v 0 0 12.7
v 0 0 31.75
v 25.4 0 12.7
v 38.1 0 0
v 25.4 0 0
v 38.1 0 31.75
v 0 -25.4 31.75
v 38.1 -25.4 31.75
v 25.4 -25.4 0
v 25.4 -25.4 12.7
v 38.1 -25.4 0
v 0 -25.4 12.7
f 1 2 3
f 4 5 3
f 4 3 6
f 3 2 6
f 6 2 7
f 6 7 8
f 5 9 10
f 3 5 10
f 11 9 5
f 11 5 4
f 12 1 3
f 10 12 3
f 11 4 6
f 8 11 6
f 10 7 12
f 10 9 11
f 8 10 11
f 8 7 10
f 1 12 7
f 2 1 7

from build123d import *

# Parameters (mm, degrees)
F0_W     = 38.1
F0_H     = 31.75
F1_DEPTH = 25.4
F2_W     = 25.3788903356
F2_H     = 12.7
F3_DEPTH = 25.4
F4_DEPTH = 25.4
F5_DEPTH = 25.4
F6_DEPTH = 25.4


with BuildPart() as f1:
    # F0 (on Front) → F1 (new body)
    with BuildSketch(Plane.XZ):
        with Locations((19.05, 15.875)):
            Rectangle(F0_W, F0_H)
    extrude(amount=F1_DEPTH)

    # F2 (on Right) → F3 (cut)
    with BuildSketch(Plane.YZ):
        with Locations((-12.6894451678, 6.35)):
            Rectangle(F2_W, F2_H)
    extrude(amount=F3_DEPTH, mode=Mode.SUBTRACT)

    # F4 (add): a face of the model
    f4_faces = [f1.faces().sort_by_distance(p)[0] for p in [
        (12.7, -25.3788903356, 6.35),
    ]]
    extrude(f4_faces, amount=F4_DEPTH)

    # F5 (cut): a face of the model
    f5_faces = [f1.faces().sort_by_distance(p)[0] for p in [
        (12.7, 0.0211096644, 6.35),
    ]]
    extrude(f5_faces, amount=-F5_DEPTH, mode=Mode.SUBTRACT)

    # F6 (cut): a face of the model
    f6_faces = [f1.faces().sort_by_distance(p)[0] for p in [
        (12.7, -25.3788903356, 6.35),
    ]]
    extrude(f6_faces, amount=-F6_DEPTH, mode=Mode.SUBTRACT)


solid = f1.part
